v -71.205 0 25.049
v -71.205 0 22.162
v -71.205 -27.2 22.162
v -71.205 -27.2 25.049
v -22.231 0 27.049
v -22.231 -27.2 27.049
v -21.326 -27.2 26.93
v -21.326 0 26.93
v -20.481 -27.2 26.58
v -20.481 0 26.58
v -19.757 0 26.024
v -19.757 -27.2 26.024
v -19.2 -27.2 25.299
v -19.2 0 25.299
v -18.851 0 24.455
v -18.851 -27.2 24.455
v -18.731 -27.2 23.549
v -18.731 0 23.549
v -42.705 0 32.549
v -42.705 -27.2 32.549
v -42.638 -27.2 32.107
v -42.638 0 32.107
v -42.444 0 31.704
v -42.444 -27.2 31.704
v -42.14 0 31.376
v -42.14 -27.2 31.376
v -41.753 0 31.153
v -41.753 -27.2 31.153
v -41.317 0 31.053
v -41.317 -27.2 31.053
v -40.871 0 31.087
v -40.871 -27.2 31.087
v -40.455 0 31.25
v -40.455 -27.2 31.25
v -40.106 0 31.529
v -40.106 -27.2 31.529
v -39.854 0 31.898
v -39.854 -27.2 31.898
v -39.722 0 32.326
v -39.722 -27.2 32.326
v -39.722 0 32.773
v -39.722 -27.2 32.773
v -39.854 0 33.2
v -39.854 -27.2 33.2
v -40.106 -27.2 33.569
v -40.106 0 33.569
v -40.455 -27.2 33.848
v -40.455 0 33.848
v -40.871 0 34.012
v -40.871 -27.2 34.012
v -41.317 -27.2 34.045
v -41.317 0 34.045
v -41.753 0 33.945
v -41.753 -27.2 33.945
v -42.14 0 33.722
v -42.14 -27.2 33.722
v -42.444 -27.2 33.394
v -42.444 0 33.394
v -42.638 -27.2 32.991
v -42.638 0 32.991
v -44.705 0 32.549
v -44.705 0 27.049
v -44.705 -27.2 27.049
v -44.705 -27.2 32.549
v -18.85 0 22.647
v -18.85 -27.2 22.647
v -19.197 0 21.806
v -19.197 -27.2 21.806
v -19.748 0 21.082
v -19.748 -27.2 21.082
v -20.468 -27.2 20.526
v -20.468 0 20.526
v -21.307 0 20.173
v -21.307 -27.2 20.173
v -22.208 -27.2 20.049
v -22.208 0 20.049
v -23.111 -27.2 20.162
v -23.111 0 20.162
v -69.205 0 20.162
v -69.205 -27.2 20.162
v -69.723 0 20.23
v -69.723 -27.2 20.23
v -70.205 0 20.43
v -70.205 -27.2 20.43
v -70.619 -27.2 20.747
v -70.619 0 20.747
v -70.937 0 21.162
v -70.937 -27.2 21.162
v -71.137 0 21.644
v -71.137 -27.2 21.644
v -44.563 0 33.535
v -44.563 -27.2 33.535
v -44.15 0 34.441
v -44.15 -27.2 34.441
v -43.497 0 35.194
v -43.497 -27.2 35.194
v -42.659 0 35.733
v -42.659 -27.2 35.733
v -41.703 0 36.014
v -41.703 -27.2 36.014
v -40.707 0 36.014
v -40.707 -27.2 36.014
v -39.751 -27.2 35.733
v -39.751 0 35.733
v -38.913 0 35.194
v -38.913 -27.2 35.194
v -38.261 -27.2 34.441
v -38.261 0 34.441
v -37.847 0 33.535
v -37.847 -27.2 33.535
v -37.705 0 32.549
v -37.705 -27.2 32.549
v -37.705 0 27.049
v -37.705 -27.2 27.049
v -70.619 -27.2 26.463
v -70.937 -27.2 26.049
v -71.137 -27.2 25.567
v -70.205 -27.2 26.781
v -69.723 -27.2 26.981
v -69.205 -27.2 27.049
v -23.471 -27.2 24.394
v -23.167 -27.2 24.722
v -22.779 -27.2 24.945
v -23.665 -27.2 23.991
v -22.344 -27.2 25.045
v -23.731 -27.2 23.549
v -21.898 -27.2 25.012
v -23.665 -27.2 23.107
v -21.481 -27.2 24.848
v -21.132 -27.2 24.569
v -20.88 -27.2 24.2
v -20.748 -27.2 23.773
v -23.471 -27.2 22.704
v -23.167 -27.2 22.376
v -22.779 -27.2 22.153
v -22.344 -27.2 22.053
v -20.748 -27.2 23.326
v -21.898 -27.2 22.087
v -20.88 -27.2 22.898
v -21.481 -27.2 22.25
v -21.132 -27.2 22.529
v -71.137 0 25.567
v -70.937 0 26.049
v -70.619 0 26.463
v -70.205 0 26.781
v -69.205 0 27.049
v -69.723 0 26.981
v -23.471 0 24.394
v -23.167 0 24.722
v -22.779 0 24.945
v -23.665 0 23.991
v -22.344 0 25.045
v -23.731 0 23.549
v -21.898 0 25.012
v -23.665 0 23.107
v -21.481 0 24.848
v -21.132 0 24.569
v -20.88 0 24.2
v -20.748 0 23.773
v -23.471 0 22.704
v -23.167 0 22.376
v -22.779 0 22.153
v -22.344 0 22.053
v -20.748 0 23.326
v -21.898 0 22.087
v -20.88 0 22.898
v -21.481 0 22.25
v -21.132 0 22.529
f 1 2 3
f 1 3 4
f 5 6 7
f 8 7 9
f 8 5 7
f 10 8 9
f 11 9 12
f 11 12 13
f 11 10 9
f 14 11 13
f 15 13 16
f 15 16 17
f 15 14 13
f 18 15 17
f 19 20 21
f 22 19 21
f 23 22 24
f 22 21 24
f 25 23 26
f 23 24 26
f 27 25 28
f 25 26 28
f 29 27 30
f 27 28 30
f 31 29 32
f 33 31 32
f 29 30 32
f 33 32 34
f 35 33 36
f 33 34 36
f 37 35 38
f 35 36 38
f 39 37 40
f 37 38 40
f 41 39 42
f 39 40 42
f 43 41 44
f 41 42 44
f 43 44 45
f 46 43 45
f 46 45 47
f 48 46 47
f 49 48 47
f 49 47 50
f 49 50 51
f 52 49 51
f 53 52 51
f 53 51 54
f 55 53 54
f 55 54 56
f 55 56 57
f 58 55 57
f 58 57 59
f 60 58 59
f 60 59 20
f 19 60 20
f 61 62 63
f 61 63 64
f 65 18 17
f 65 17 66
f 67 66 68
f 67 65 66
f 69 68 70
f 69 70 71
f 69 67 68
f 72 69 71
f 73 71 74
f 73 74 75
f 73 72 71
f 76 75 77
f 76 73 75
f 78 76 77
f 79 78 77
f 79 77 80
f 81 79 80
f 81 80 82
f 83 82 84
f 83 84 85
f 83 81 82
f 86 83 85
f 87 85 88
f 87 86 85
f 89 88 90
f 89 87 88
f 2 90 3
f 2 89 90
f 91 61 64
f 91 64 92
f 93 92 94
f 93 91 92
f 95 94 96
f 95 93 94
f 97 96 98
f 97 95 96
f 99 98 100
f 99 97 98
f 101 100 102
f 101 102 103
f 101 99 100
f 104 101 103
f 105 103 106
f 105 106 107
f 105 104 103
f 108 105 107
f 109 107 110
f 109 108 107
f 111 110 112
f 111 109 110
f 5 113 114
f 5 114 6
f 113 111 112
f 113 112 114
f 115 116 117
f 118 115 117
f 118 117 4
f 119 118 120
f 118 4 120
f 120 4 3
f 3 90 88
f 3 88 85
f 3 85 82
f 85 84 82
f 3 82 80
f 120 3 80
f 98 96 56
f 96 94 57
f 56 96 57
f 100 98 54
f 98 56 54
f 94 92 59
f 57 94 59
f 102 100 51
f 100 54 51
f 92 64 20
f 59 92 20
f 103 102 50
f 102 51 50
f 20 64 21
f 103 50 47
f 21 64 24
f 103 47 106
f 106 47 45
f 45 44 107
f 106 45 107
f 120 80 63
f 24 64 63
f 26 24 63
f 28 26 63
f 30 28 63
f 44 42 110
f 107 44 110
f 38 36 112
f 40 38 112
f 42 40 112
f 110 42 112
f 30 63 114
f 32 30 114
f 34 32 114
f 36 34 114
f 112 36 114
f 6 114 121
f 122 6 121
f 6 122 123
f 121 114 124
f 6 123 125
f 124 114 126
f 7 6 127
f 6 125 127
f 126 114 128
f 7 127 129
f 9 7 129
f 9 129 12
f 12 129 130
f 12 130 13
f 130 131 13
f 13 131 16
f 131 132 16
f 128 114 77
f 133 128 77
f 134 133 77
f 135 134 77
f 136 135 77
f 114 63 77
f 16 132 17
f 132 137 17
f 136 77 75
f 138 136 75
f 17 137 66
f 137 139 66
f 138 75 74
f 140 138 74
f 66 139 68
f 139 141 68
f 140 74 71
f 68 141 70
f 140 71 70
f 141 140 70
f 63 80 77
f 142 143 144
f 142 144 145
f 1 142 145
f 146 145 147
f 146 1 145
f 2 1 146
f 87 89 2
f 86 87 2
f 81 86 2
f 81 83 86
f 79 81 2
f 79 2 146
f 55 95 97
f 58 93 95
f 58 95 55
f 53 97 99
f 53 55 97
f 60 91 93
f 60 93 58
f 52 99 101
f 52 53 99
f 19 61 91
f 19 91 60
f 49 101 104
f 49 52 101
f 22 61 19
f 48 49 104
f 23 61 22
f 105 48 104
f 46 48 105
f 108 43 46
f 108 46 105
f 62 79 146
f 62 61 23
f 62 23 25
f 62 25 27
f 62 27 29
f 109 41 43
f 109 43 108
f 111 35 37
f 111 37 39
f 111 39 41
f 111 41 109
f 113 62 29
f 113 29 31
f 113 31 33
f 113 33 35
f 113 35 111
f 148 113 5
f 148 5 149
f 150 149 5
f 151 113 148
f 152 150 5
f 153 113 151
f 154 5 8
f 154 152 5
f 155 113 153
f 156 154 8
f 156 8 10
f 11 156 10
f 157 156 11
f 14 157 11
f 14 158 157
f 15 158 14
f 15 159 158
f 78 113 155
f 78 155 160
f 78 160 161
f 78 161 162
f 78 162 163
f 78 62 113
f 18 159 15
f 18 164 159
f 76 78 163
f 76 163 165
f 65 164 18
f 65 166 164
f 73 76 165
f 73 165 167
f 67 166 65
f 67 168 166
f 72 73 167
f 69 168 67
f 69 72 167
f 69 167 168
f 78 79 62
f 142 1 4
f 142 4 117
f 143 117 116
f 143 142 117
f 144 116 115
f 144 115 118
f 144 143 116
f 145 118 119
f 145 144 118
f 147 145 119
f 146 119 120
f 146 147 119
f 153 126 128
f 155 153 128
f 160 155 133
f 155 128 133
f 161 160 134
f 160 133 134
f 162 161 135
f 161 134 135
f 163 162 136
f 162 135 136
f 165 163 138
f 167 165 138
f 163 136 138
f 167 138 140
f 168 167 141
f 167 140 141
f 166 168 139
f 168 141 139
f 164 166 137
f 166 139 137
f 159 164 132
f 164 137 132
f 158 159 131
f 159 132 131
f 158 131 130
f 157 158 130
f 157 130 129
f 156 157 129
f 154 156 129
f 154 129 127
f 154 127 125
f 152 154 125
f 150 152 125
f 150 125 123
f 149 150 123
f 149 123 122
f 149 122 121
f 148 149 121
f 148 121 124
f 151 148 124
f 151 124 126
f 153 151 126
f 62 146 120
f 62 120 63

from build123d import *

# Parameters (mm, degrees)
F1_DEPTH = 27.2
F2_D     = 3
F3_D     = 3
F4_ANGLE = 180


with BuildPart() as f1:
    # F0 (on Front) → F1 (new body)
    with BuildSketch(Plane.XZ):
        with BuildLine():
            ThreePointArc((-44.7051230669, 7.7739851549), (-41.2051230669, 4.2739851549), (-37.7051230669, 7.7739851549))
            ThreePointArc((-37.7051230669, 7.7739851549), (-41.2051230669, 11.2739851549), (-44.7051230669, 7.7739851549))
        make_face()
        with BuildLine():
            ThreePointArc((-44.7051230669, 7.7739851549), (-41.2051230669, 11.2739851549), (-37.7051230669, 7.7739851549))
            Line((-37.7051230669, 7.7739851549), (-37.7051230669, 13.2739851549))
            Line((-37.7051230669, 13.2739851549), (-44.7051230669, 13.2739851549))
            Line((-44.7051230669, 13.2739851549), (-44.7051230669, 7.7739851549))
        make_face()
        with BuildLine():
            Line((-44.7051230669, 13.2739851549), (-37.7051230669, 13.2739851549))
            Line((-37.7051230669, 13.2739851549), (-22.2314571059, 13.2739851549))
            ThreePointArc((-22.2314571059, 13.2739851549), (-25.7032370007, 16.3304264081), (-23.1114218713, 20.1615598053))
            Line((-23.1114218713, 20.1615598053), (-69.2051230669, 20.1615598053))
            ThreePointArc((-69.2051230669, 20.1615598053), (-70.6193366293, 19.5757733676), (-71.2051230669, 18.1615598053))
            Line((-71.2051230669, 18.1615598053), (-71.2051230669, 15.2739851549))
            ThreePointArc((-71.2051230669, 15.2739851549), (-70.6193366293, 13.8597715926), (-69.2051230669, 13.2739851549))
            Line((-69.2051230669, 13.2739851549), (-44.7051230669, 13.2739851549))
        make_face()
        with BuildLine():
            Line((-22.2314571059, 20.1615598053), (-22.2314571059, 13.2739851549))
            ThreePointArc((-22.2314571059, 13.2739851549), (-19.7565833717, 14.2991114208), (-18.7314571059, 16.7739851549))
            ThreePointArc((-18.7314571059, 16.7739851549), (-20.0901813972, 19.5425476591), (-23.1114218713, 20.1615598053))
            Line((-23.1114218713, 20.1615598053), (-22.2314571059, 20.1615598053))
        make_face()
        with BuildLine():
            ThreePointArc((-23.1114218713, 20.1615598053), (-25.7032370007, 16.3304264081), (-22.2314571059, 13.2739851549))
            Line((-22.2314571059, 13.2739851549), (-22.2314571059, 20.1615598053))
            Line((-22.2314571059, 20.1615598053), (-23.1114218713, 20.1615598053))
        make_face()
    extrude(amount=-F1_DEPTH)

    # F2 (through all)
    with Locations(Plane.XZ):
        with Locations((-41.2051230669, 7.7739851549)):
            Hole(F2_D / 2)

    # F3 (through all)
    with Locations(Plane.XZ):
        with Locations((-22.2314571059, 16.7739851549)):
            Hole(F3_D / 2)


with BuildPart() as f1_1:
    # F4: moved
    add(f1.part.rotate(Axis((-46.1582724691, 0, 20.1615598053), (-1, 0, 0)), F4_ANGLE))


solid = f1_1.part
